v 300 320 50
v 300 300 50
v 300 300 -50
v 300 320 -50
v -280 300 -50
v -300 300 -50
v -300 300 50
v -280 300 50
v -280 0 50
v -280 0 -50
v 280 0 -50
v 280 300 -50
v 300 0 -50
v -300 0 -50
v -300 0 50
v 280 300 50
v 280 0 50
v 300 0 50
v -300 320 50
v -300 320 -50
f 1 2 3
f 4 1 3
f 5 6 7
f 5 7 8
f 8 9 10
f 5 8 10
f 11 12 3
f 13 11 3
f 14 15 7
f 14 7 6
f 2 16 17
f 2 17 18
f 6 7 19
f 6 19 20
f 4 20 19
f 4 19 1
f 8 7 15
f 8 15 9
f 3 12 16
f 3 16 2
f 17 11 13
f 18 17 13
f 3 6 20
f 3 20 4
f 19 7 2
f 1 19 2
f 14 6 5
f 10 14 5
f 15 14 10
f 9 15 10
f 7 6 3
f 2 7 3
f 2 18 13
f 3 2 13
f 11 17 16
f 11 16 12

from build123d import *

# Parameters (mm, degrees)
SKETCH1_W             = 20
SKETCH1_H             = 100
BOSS_EXTRUDE1_DEPTH   = 300
BOSS_EXTRUDE1_2_DEPTH = 300
SKETCH2_W             = 600
SKETCH2_H             = 100
BOSS_EXTRUDE2_DEPTH   = 20


with BuildPart() as part:
    # Sketch1 → Boss-Extrude1 (new body)
    with BuildSketch(Plane(origin=(0, 0, 0), x_dir=(1, 0, 0), z_dir=(0, 1, 0))):
        with Locations((-290, 0)):
            Rectangle(SKETCH1_W, SKETCH1_H)
    extrude(amount=BOSS_EXTRUDE1_DEPTH)


with BuildPart() as body_2:
    # Sketch1 → Boss-Extrude1 2 (new body)
    with BuildSketch(Plane(origin=(0, 0, 0), x_dir=(1, 0, 0), z_dir=(0, 1, 0))):
        with Locations((290, 0)):
            Rectangle(SKETCH1_W, SKETCH1_H)
    extrude(amount=BOSS_EXTRUDE1_2_DEPTH)


with BuildPart() as body_3:
    # Sketch2 → Boss-Extrude2 (new body)
    with BuildSketch(Plane(origin=(0, 300, 0), x_dir=(1, 0, 0), z_dir=(0, 1, 0))):
        Rectangle(SKETCH2_W, SKETCH2_H)
    extrude(amount=BOSS_EXTRUDE2_DEPTH)


solid = Compound([part.part, body_2.part, body_3.part])
